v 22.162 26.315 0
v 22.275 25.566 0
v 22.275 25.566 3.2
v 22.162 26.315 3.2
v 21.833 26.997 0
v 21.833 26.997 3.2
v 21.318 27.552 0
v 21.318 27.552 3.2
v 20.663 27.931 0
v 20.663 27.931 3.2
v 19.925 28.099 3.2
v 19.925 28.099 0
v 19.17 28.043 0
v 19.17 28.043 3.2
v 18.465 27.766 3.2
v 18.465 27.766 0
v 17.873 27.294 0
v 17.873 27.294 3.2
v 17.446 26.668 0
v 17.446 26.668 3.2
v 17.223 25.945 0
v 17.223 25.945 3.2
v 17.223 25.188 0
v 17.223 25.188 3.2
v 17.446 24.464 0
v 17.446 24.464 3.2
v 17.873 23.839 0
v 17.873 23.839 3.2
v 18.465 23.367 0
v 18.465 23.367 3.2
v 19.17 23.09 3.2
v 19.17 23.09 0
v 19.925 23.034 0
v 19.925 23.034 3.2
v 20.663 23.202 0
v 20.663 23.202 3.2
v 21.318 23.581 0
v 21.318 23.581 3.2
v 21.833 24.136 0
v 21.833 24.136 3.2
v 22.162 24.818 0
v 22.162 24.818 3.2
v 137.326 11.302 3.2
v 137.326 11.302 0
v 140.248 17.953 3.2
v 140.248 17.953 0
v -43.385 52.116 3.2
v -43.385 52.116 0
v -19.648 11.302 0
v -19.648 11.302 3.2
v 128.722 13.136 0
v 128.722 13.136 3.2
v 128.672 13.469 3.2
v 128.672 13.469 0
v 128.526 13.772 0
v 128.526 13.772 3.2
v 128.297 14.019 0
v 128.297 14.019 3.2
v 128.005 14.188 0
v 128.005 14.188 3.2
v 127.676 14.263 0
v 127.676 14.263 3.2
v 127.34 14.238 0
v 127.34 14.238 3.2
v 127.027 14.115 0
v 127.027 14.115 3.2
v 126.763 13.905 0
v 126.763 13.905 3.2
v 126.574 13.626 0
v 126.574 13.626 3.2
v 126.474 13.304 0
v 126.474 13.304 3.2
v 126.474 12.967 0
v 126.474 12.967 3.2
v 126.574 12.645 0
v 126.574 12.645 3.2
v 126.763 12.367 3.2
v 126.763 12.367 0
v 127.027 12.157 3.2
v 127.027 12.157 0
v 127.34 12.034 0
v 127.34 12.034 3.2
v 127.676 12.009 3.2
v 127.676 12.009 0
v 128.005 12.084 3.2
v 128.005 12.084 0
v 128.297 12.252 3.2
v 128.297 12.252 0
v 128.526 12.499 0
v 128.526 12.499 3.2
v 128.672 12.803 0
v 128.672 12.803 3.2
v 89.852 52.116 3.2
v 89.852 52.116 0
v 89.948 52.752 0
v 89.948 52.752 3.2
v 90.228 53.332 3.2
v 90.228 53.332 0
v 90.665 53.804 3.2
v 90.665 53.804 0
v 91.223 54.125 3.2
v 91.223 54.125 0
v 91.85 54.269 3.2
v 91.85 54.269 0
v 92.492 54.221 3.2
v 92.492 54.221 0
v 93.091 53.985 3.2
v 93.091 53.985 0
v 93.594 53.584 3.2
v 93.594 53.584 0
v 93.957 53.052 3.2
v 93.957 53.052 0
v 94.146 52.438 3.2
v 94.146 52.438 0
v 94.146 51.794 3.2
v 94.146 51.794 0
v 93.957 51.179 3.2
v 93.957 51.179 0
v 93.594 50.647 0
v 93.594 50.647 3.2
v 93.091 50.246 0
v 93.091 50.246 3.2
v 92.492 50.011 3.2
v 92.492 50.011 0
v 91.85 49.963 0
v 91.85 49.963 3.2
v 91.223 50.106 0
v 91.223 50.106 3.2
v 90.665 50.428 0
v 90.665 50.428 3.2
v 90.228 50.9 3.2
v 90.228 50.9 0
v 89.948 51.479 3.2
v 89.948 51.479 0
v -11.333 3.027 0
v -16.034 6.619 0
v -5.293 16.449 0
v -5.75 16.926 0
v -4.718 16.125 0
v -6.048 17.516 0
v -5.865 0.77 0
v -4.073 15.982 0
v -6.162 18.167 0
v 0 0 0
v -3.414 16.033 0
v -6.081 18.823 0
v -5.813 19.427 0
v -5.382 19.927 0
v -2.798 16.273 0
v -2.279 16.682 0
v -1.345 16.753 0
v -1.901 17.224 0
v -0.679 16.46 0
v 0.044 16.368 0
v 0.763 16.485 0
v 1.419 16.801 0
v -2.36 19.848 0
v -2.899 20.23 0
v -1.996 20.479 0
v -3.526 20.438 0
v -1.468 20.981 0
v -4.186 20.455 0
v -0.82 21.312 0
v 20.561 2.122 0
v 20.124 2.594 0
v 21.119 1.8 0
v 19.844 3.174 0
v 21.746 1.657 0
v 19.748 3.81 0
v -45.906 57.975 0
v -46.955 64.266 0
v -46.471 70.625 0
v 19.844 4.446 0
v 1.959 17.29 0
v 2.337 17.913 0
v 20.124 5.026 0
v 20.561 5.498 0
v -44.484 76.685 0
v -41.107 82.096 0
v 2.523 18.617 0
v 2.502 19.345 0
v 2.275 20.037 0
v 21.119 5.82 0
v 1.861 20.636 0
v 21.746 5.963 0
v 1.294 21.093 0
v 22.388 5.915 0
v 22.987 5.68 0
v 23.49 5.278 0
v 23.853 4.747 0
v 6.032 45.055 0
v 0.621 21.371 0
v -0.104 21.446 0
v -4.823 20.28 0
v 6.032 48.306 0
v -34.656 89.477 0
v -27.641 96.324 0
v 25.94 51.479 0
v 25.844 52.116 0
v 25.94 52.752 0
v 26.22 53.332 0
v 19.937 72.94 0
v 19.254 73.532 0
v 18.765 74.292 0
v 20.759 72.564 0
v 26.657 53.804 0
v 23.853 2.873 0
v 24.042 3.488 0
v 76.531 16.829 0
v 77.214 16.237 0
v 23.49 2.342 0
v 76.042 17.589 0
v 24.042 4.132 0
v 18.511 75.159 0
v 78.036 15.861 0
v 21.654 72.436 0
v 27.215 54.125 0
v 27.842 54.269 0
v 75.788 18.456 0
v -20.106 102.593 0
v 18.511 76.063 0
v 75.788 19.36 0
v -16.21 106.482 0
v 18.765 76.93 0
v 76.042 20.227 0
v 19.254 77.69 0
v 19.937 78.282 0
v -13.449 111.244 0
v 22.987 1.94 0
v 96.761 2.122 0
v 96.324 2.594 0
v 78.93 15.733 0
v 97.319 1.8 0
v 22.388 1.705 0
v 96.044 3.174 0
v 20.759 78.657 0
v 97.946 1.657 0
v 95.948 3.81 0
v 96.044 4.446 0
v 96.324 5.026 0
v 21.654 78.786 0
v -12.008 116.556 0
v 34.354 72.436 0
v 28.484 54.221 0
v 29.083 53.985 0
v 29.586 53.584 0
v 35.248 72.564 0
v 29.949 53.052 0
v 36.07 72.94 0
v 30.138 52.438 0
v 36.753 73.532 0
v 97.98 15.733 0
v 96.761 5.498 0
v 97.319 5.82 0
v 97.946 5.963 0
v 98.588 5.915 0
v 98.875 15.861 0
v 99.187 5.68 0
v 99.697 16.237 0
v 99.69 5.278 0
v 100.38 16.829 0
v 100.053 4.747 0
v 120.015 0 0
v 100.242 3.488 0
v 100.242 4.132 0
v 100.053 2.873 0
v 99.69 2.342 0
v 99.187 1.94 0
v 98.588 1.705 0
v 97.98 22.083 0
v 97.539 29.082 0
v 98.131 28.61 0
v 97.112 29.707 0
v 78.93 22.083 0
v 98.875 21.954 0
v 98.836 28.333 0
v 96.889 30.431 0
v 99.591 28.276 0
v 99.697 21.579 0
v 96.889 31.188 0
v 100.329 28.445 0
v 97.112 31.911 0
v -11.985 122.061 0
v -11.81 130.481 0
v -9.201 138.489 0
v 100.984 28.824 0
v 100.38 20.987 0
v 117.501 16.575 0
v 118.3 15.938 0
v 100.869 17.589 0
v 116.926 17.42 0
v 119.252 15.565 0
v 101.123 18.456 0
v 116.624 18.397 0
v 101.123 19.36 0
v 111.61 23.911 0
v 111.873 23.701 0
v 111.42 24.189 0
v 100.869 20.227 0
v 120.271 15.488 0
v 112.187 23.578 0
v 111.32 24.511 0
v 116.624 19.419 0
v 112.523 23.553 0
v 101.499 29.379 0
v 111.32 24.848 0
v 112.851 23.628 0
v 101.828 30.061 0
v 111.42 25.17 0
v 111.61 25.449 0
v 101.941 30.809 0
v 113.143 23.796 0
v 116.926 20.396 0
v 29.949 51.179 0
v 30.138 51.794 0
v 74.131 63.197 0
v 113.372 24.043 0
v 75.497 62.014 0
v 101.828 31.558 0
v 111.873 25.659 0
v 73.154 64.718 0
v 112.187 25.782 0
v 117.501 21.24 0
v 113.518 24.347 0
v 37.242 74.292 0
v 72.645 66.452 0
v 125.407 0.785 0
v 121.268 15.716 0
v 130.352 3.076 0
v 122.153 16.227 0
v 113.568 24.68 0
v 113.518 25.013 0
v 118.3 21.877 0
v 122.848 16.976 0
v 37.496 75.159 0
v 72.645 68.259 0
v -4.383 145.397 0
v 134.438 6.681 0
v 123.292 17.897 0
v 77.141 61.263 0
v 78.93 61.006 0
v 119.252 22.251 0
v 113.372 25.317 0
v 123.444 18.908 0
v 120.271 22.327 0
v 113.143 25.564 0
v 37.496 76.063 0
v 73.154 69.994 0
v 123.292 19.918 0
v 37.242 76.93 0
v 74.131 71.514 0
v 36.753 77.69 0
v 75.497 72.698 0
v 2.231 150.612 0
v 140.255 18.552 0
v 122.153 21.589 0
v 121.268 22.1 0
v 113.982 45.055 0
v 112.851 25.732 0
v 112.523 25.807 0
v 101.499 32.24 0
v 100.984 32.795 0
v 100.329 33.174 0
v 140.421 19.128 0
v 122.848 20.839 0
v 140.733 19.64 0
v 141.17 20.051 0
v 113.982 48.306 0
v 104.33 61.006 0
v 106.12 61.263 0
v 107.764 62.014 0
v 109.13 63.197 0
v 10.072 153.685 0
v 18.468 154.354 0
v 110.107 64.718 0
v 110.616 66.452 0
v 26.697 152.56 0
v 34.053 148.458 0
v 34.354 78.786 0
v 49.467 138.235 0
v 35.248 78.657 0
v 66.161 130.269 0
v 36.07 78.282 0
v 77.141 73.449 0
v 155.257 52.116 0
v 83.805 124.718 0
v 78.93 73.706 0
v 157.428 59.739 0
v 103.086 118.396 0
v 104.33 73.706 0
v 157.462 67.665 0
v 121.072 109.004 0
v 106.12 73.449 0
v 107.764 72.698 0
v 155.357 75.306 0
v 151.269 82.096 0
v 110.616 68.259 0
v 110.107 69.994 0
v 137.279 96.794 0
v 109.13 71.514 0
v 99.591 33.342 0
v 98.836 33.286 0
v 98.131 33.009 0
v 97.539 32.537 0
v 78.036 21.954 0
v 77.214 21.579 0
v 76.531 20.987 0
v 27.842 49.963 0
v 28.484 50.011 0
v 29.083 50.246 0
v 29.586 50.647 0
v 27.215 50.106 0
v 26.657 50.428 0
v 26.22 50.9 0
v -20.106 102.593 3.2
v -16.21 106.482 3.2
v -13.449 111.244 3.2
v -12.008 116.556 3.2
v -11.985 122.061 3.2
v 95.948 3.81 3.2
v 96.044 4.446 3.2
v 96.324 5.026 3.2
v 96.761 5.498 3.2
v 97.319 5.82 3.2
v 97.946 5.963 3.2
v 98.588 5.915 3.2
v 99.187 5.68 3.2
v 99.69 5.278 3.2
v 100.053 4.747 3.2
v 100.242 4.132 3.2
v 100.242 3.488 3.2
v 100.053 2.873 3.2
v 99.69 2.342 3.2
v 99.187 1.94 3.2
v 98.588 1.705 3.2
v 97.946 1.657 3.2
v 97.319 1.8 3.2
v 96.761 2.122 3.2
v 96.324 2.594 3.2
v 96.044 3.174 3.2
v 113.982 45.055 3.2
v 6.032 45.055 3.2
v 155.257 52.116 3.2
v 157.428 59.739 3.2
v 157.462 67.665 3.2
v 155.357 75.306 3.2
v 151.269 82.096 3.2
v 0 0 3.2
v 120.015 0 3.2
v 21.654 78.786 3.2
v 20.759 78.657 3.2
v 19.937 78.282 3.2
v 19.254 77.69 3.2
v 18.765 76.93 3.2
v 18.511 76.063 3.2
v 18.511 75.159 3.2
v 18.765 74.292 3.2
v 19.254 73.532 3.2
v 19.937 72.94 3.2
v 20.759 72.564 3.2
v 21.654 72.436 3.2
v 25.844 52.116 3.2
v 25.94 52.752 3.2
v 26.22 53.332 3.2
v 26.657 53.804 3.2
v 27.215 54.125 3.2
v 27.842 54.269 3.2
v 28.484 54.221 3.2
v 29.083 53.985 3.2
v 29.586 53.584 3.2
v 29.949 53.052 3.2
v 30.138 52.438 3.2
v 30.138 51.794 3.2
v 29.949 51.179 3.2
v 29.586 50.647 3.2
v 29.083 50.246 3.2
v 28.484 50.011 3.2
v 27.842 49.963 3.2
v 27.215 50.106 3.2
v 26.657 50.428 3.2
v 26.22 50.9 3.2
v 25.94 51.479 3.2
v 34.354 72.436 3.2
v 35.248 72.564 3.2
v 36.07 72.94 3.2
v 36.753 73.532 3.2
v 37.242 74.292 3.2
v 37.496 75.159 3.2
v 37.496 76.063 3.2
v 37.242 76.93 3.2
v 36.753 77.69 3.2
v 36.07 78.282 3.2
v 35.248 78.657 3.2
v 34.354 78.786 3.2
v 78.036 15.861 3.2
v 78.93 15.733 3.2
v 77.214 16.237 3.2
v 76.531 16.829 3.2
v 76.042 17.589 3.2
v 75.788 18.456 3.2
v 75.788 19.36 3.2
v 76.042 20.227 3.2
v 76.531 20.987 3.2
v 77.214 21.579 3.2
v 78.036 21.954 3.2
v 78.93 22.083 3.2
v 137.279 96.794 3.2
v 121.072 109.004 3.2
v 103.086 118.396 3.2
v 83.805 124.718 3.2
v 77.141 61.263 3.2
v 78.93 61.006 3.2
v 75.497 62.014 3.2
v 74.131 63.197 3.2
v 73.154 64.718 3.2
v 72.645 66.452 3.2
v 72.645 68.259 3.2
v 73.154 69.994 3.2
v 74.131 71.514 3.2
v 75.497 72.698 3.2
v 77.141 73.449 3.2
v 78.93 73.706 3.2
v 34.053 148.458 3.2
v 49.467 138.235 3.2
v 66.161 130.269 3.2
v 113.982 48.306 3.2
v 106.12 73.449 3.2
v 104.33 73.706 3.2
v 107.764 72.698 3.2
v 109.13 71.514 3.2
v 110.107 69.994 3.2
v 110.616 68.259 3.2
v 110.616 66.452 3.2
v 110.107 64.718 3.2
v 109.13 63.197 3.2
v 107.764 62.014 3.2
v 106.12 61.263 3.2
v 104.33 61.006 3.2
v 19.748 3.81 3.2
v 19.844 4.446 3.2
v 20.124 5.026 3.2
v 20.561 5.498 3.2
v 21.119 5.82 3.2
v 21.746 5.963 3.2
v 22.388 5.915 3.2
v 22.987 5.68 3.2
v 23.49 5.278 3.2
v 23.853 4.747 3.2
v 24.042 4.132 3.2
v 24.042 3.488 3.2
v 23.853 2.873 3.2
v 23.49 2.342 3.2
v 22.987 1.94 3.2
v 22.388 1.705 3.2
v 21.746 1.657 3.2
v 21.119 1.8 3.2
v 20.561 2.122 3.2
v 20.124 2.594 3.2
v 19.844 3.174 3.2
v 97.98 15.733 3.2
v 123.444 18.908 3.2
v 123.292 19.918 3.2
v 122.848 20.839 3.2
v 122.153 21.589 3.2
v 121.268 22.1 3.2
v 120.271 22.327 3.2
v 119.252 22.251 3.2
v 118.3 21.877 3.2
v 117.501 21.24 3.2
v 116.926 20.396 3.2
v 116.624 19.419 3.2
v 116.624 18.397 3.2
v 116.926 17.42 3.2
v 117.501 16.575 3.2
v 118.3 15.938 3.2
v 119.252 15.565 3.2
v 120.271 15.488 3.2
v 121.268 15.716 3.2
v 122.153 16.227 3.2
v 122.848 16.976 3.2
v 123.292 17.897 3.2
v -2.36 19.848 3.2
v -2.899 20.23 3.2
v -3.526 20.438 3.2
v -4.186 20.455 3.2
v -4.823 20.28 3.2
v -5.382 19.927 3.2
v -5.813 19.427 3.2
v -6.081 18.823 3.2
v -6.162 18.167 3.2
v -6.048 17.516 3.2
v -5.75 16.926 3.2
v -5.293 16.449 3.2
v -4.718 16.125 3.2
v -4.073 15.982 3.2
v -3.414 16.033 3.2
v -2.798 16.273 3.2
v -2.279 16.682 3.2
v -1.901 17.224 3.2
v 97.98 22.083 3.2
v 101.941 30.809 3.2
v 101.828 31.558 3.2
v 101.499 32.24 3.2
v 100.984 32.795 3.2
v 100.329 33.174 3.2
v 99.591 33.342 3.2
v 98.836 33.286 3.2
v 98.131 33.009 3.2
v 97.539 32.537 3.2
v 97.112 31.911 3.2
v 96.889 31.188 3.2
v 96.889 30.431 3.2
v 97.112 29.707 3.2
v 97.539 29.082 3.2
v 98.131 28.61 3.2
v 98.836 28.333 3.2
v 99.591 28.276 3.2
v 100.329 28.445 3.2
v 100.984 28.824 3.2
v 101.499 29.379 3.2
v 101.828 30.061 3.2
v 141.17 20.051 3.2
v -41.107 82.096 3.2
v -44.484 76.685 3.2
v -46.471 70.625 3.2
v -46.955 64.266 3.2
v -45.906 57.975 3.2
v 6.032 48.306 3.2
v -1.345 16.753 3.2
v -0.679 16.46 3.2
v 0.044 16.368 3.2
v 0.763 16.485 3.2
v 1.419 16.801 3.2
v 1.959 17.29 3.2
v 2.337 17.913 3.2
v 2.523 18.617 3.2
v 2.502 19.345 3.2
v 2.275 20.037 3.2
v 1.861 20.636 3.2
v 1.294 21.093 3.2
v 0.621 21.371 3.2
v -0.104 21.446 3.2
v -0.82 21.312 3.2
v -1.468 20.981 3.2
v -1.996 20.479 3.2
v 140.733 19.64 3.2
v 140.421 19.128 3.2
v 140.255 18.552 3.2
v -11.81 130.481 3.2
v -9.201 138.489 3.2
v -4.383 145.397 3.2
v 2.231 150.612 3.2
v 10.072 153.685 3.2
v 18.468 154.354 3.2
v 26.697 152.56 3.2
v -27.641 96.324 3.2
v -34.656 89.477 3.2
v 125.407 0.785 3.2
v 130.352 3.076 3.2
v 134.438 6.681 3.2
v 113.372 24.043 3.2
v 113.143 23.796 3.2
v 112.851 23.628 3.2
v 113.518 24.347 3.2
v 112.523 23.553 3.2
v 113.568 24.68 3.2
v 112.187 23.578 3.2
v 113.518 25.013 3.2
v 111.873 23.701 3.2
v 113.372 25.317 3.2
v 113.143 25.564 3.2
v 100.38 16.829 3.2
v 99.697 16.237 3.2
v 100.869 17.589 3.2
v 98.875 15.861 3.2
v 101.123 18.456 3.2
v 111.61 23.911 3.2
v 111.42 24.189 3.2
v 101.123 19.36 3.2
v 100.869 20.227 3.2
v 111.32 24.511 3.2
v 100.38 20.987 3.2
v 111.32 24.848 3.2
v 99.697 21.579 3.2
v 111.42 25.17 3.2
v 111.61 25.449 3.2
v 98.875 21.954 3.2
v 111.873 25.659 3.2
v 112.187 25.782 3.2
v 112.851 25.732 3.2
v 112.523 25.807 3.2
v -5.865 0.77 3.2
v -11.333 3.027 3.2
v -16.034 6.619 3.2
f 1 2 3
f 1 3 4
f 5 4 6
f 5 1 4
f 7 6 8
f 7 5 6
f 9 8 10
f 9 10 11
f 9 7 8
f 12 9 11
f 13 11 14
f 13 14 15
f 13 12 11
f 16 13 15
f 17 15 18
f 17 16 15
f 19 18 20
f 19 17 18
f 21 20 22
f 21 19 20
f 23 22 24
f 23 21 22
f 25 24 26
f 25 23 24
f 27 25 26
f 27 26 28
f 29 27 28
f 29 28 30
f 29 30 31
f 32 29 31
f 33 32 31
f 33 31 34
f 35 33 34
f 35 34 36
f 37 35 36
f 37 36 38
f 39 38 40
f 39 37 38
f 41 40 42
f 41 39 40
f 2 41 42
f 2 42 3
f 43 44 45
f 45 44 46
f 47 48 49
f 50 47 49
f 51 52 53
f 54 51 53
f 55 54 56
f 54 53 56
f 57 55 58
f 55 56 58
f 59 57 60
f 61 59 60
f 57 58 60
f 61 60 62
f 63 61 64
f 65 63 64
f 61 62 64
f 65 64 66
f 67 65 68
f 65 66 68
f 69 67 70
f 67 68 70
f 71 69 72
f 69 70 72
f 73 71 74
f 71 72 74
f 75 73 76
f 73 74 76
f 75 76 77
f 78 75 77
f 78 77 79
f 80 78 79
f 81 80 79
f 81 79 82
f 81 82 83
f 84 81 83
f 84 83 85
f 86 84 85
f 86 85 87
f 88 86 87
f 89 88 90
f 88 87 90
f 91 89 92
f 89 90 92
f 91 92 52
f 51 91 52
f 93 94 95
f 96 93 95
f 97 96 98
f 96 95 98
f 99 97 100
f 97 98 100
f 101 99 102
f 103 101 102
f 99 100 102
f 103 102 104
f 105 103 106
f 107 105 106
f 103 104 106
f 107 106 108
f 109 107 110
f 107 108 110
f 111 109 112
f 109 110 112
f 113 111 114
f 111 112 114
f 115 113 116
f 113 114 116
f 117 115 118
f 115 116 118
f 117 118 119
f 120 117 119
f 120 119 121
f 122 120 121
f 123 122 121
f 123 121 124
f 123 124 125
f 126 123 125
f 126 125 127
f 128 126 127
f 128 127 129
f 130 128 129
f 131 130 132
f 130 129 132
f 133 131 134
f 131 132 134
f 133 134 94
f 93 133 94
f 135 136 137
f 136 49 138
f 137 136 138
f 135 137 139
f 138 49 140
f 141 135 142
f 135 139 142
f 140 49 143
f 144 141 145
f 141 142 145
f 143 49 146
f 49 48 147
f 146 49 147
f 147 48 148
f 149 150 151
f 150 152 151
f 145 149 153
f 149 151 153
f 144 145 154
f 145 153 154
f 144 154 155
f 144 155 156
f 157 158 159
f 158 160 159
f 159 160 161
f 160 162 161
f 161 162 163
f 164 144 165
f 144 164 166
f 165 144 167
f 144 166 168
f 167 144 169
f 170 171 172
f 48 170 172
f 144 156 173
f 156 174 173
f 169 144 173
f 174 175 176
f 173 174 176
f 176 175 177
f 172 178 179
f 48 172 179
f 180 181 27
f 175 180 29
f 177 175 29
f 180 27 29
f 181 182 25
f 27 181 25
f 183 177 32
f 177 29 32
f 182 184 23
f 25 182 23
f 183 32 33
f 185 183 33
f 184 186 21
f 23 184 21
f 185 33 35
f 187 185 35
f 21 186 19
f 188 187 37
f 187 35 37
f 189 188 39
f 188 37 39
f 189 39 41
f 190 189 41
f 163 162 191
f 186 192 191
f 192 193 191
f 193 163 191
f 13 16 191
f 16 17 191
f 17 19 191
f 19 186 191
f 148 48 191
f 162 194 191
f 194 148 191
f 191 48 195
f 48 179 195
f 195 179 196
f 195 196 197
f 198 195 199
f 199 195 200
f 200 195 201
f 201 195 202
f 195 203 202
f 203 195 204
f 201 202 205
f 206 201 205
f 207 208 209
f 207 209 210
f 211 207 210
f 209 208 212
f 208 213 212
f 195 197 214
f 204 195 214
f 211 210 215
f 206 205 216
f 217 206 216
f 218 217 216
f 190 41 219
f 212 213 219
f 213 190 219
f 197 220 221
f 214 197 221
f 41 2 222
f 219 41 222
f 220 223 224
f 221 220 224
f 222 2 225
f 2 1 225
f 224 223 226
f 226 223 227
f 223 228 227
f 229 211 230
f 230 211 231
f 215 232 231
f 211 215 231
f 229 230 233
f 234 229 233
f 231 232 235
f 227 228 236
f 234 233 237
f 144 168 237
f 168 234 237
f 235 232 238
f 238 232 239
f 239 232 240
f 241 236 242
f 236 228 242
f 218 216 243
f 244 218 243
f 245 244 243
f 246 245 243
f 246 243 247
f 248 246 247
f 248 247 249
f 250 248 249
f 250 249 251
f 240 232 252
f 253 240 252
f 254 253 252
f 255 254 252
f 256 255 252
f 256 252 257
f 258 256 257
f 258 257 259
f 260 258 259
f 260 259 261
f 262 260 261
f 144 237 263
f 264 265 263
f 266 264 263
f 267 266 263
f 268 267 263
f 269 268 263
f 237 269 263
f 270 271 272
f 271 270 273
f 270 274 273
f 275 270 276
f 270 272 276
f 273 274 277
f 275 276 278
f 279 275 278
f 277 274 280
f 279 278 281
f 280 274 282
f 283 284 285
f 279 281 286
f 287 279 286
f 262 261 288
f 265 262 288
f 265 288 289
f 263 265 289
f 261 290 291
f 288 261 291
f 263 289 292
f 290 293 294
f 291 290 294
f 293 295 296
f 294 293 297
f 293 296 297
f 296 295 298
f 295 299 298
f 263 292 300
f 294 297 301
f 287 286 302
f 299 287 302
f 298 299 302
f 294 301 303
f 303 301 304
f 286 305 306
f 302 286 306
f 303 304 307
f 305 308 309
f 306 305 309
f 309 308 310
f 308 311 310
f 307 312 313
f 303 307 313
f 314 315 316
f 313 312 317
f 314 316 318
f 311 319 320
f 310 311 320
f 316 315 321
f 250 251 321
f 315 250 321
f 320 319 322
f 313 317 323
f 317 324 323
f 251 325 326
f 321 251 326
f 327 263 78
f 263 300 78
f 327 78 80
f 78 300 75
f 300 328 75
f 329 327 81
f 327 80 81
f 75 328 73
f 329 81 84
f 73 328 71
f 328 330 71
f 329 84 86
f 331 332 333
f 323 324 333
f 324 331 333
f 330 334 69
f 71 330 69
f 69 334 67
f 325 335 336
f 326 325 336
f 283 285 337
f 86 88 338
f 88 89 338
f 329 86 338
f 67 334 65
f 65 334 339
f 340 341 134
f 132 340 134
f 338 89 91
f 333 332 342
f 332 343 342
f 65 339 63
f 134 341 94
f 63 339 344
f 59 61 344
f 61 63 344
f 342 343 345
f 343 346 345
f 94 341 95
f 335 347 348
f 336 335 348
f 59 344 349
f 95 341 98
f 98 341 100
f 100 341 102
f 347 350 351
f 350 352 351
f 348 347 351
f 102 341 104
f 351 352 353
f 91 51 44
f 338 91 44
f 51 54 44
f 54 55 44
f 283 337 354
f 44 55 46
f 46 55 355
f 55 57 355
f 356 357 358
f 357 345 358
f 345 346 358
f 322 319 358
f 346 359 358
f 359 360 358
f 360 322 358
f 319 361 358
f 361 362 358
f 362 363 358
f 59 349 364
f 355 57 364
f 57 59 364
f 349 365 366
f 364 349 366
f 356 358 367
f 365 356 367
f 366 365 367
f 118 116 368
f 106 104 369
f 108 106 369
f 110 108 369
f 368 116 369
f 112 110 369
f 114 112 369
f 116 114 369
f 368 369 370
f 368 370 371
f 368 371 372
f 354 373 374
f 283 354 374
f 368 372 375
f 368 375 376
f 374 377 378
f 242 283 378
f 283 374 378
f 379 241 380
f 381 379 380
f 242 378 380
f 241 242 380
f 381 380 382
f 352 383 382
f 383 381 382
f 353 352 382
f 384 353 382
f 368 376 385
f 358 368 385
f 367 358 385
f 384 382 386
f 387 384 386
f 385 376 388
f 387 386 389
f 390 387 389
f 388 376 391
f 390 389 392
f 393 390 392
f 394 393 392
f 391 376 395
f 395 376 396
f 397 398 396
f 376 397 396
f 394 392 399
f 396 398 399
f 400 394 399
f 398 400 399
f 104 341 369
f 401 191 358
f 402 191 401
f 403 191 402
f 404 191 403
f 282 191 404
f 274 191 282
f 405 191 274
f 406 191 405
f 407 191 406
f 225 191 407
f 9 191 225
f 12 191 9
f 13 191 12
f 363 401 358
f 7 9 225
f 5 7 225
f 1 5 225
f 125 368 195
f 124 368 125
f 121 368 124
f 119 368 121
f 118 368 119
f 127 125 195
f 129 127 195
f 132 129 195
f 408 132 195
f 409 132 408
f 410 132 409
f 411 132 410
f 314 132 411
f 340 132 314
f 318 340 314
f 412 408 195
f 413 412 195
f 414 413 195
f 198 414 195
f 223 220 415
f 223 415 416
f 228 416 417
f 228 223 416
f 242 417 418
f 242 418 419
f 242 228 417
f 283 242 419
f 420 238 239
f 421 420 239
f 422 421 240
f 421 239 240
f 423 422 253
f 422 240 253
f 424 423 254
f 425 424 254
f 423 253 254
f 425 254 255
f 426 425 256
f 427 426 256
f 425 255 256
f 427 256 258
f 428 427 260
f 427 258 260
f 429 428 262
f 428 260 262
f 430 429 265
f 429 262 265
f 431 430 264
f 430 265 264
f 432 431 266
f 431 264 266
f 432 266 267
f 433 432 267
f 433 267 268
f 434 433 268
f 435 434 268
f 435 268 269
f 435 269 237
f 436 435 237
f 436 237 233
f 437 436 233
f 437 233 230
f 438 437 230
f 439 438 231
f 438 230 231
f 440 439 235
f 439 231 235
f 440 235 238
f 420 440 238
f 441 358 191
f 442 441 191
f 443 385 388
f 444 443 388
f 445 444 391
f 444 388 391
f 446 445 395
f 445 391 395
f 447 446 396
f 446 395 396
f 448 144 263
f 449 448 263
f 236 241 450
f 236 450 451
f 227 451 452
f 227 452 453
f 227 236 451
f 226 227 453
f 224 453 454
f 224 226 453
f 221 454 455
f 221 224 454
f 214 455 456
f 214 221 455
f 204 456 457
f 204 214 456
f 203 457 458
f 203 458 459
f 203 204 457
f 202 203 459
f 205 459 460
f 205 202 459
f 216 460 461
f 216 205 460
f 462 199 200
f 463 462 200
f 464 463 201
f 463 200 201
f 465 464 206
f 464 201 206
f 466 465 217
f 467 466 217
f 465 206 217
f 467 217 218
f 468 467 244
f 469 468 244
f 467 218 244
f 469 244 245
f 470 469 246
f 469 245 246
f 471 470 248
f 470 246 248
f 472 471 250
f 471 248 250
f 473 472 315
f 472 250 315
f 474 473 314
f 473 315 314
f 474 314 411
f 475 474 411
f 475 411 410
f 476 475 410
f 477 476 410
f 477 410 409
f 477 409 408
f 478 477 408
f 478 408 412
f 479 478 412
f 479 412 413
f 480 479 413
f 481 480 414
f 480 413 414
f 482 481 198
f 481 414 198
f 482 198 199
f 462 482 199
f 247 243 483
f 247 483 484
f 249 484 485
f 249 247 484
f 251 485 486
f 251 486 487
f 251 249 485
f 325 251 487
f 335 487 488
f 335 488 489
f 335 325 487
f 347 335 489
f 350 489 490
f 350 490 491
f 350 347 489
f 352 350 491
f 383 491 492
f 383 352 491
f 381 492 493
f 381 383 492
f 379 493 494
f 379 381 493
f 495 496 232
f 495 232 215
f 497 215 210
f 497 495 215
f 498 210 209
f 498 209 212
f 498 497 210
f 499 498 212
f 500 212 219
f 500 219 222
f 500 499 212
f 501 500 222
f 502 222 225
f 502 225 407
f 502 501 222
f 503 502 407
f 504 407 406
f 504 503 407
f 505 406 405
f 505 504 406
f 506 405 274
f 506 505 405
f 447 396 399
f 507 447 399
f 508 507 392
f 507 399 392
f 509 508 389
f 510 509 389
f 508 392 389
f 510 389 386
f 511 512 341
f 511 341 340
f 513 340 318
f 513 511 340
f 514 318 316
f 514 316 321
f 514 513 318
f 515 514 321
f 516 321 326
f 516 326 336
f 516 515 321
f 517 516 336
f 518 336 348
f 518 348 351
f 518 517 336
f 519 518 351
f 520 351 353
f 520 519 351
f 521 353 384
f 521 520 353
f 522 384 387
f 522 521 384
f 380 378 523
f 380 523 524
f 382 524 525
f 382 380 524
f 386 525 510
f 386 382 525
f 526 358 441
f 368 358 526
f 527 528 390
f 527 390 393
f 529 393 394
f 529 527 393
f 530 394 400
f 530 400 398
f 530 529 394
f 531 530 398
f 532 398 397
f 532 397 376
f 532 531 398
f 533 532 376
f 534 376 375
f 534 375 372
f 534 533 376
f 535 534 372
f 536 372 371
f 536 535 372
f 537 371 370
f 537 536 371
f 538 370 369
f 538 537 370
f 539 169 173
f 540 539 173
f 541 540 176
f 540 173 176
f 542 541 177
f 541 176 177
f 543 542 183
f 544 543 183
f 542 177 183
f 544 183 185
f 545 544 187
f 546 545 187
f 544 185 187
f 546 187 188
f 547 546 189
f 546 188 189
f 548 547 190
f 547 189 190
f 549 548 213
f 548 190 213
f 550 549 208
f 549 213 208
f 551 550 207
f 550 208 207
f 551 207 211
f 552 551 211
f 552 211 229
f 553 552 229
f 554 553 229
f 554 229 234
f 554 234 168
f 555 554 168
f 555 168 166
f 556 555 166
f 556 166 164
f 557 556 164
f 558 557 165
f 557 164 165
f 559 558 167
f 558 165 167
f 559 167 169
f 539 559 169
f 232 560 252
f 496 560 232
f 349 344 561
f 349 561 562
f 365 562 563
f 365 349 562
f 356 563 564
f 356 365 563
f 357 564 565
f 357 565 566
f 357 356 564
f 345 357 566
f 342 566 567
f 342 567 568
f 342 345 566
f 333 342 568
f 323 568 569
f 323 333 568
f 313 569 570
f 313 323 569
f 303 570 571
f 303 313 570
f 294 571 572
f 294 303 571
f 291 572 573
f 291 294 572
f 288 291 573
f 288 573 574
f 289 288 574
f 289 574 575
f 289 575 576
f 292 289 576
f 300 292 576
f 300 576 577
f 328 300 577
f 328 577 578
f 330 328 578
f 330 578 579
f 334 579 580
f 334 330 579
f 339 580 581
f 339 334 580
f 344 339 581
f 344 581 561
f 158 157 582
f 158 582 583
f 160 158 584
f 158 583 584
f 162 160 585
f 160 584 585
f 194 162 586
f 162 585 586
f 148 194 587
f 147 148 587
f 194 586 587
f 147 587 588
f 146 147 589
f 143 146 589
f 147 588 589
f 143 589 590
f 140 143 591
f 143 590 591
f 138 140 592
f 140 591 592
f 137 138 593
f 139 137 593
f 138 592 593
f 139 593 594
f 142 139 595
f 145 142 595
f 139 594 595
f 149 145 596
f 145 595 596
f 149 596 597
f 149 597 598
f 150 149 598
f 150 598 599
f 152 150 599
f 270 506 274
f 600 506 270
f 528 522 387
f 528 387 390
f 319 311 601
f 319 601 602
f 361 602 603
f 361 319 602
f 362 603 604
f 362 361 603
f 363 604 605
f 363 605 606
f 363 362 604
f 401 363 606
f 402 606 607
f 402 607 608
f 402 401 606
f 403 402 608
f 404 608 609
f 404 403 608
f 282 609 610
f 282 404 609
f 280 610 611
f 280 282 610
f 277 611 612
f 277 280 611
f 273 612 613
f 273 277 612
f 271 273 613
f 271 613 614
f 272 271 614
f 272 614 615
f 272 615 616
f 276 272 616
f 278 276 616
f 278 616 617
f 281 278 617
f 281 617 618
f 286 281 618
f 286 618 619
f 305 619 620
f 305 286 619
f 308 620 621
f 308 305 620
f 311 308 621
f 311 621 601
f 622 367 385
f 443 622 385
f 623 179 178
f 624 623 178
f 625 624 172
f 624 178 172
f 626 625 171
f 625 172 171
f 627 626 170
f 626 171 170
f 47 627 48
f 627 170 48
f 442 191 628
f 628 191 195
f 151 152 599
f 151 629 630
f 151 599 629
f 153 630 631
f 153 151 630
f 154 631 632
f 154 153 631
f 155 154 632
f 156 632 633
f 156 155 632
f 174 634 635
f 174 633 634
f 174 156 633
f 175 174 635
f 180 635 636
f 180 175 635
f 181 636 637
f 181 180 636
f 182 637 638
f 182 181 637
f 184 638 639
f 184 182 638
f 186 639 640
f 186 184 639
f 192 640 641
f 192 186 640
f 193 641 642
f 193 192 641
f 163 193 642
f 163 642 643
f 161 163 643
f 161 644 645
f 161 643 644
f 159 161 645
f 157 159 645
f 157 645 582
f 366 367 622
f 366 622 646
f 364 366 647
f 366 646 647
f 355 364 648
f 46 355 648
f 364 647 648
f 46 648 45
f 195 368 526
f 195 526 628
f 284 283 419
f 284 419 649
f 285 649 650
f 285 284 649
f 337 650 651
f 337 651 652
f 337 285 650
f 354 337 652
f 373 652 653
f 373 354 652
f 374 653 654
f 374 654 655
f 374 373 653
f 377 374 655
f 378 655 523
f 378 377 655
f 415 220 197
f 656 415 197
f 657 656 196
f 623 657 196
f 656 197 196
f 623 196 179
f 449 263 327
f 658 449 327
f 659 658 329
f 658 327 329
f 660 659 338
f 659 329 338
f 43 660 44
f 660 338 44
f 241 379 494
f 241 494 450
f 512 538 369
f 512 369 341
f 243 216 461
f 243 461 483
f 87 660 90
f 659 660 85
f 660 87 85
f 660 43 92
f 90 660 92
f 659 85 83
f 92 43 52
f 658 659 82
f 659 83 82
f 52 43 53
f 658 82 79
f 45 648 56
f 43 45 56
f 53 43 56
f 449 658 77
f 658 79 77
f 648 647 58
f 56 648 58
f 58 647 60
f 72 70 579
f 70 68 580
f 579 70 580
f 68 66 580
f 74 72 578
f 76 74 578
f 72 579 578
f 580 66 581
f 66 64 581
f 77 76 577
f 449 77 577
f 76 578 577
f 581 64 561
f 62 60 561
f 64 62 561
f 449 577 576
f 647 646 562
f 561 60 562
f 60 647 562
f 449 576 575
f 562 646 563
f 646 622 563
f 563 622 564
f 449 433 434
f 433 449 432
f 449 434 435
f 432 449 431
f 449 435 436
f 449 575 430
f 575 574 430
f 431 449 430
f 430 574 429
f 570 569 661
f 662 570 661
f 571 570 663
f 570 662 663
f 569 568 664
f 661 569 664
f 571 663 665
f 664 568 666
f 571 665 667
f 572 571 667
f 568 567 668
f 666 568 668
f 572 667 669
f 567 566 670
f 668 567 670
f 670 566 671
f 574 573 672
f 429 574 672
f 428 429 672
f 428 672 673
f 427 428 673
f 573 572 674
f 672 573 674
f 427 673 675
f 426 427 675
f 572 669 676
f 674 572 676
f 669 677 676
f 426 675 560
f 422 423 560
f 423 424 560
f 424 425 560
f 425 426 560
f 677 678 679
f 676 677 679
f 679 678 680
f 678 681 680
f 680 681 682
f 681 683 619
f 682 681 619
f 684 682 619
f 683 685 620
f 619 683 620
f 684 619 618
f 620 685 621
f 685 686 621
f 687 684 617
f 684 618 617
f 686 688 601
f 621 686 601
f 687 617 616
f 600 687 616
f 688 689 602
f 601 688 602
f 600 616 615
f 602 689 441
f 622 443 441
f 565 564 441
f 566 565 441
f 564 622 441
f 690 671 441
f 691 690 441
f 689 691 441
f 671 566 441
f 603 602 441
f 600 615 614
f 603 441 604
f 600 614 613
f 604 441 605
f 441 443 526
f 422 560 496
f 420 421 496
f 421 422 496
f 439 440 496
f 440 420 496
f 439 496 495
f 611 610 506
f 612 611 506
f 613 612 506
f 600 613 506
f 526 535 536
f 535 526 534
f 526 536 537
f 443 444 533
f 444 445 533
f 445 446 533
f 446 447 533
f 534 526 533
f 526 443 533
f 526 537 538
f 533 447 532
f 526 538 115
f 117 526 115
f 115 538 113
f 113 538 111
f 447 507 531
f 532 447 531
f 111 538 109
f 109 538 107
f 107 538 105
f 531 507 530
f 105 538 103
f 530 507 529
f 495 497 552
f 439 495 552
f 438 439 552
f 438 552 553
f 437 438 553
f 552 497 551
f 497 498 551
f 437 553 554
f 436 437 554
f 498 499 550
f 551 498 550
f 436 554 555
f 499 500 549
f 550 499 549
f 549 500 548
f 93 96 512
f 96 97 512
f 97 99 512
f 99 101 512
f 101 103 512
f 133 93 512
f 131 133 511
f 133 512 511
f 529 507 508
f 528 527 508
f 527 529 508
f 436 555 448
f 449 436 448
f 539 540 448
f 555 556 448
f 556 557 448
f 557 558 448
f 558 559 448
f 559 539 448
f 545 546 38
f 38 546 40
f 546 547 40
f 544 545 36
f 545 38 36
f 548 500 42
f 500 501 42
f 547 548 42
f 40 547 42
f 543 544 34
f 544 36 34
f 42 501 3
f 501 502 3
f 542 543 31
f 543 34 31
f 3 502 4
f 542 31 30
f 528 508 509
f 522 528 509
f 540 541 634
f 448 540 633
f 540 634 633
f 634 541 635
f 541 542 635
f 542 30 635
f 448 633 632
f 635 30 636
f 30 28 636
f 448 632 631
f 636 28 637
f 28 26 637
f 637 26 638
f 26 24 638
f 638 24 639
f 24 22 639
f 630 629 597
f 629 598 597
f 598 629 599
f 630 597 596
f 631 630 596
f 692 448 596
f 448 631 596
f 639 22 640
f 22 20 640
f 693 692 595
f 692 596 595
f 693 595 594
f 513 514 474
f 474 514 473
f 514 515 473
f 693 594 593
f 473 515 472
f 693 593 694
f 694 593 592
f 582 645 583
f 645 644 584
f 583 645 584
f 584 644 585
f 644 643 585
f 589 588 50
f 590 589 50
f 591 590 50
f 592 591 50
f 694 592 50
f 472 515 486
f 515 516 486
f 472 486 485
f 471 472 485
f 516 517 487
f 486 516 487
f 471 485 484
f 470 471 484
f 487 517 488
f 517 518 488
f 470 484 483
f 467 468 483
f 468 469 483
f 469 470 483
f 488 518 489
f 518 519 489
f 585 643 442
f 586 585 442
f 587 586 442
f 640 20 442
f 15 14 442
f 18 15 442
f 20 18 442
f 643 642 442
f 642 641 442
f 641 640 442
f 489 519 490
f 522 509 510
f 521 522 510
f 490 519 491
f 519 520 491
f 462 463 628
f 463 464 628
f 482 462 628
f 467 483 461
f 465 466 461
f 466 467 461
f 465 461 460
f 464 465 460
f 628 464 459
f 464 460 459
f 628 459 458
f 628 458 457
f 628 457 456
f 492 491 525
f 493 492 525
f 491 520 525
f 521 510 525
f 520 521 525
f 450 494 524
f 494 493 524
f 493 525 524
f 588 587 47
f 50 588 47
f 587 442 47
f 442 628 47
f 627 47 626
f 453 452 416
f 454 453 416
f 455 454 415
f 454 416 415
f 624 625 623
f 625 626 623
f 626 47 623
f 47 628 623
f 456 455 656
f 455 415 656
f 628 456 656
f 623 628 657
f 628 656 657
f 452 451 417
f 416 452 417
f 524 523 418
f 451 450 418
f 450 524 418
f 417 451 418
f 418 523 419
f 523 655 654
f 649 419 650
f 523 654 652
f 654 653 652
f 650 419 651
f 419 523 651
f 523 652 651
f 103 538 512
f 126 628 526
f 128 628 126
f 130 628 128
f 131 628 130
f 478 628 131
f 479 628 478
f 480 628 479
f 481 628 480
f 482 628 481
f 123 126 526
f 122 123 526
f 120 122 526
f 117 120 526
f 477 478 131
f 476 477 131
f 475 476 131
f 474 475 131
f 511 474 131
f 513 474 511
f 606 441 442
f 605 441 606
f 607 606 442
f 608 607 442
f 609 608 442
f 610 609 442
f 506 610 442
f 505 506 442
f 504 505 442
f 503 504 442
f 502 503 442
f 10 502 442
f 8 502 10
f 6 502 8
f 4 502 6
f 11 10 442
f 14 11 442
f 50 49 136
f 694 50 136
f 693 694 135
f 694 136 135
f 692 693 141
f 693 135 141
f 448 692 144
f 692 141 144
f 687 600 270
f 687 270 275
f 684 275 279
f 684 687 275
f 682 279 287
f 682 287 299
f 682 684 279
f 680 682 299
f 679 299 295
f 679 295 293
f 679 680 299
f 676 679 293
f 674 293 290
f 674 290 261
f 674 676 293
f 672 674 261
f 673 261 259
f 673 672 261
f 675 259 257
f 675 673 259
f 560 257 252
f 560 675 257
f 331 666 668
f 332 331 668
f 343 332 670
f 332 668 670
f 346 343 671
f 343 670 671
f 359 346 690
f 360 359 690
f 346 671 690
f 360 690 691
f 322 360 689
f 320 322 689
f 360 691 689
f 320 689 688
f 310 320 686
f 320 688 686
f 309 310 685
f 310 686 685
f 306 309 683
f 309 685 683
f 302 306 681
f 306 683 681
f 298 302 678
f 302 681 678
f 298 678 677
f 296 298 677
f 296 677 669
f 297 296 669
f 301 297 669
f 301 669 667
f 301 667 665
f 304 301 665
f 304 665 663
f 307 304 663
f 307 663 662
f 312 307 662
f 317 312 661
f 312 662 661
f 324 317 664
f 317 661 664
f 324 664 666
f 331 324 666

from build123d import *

# Parameters (mm, degrees)
SKETCH1_R           = 3.429
SKETCH1_R_2         = 2.54
BOSS_EXTRUDE1_DEPTH = 3.2004
SKETCH2_R           = 2.159
CUT_EXTRUDE1_DEPTH  = 3.2004
CUT_EXTRUDE8_DEPTH  = 3.2004
SKETCH11_W          = 107.95
SKETCH11_H          = 3.2512
CUT_EXTRUDE9_DEPTH  = 3.2004
SKETCH12_R          = 1.1303
CUT_EXTRUDE11_DEPTH = 3.2004
SKETCH13_R          = 2.2479
CUT_EXTRUDE12_DEPTH = 3.2004
BOSS_EXTRUDE2_DEPTH = 3.2004


with BuildPart() as part:
    # Sketch1 → Boss-Extrude1 (new body)
    with BuildSketch(Plane.XY):
        with BuildLine():
            Line((0, 0), (120.015, 0))
            ThreePointArc((120.015, 0), (130.351788397, 3.075697789), (137.325636158, 11.302152593))
            Line((137.325636158, 11.302152593), (155.257499999, 52.11572))
            ThreePointArc((155.257499999, 52.11572), (157.462147967, 67.664529981), (151.26869294, 82.095991421))
            ThreePointArc((151.26869294, 82.095991421), (55.081013593, 128.103082212), (-41.106665754, 82.095991421))
            ThreePointArc((-41.106665754, 82.095991421), (-46.904819593, 67.459968464), (-43.385473773, 52.11572))
            Line((-43.385473773, 52.11572), (-19.648099871, 11.302152593))
            ThreePointArc((-19.648099871, 11.302152593), (-11.333429333, 3.027112684), (0, 0))
        make_face()
        with Locations((120.015, 18.90776)):
            Circle(SKETCH1_R, mode=Mode.SUBTRACT)
        with Locations((0, 18.90776)):
            Circle(SKETCH1_R_2, mode=Mode.SUBTRACT)
        with Locations((19.734727626, 25.566426992)):
            Circle(SKETCH1_R_2, mode=Mode.SUBTRACT)
        with Locations((99.400822531, 30.809360911)):
            Circle(SKETCH1_R_2, mode=Mode.SUBTRACT)
    extrude(amount=BOSS_EXTRUDE1_DEPTH)

    # Sketch2 → Cut-Extrude1 (cut)
    with BuildSketch(Plane(origin=(0, 0, 0), x_dir=(-1, 0, 0), z_dir=(0, 0, -1))):
        with Locations((-92.0115, 52.115719911)):
            Circle(SKETCH2_R)
        with Locations((-28.0035, 52.115719911)):
            Circle(SKETCH2_R)
        with Locations((-98.1075, 3.81)):
            Circle(SKETCH2_R)
        with Locations((-21.9075, 3.81)):
            Circle(SKETCH2_R)
    extrude(amount=-CUT_EXTRUDE1_DEPTH, mode=Mode.SUBTRACT)

    # Sketch10 → Cut-Extrude8 (cut)
    with BuildSketch(Plane(origin=(0, 0, 0), x_dir=(-1, 0, 0), z_dir=(0, 0, -1))):
        with BuildLine():
            Line((-34.3535, 78.785719911), (-21.6535, 78.785719911))
            ThreePointArc((-21.6535, 78.785719911), (-18.4785, 75.610719911), (-21.6535, 72.435719911))
            Line((-21.6535, 72.435719911), (-34.3535, 72.435719911))
            ThreePointArc((-34.3535, 72.435719911), (-37.5285, 75.610719911), (-34.3535, 78.785719911))
        make_face()
    extrude(amount=-CUT_EXTRUDE8_DEPTH, mode=Mode.SUBTRACT)

    # Sketch11 → Cut-Extrude9 (cut)
    with BuildSketch(Plane(origin=(0, 0, 0), x_dir=(-1, 0, 0), z_dir=(0, 0, -1))):
        with Locations((-60.0075, 46.680119911)):
            Rectangle(SKETCH11_W, SKETCH11_H)
    extrude(amount=-CUT_EXTRUDE9_DEPTH, mode=Mode.SUBTRACT)

    # Sketch12 → Cut-Extrude11 (cut)
    with BuildSketch(Plane.XY.offset(3.2004)):
        with Locations((112.438115095, 24.679799513)):
            Circle(SKETCH12_R)
        with Locations((127.591884905, 13.135720487)):
            Circle(SKETCH12_R)
        with BuildLine():
            Line((78.9305, 73.70572), (104.3305, 73.70572))
            ThreePointArc((104.3305, 73.70572), (110.6805, 67.35572), (104.3305, 61.00572))
            Line((104.3305, 61.00572), (78.9305, 61.00572))
            ThreePointArc((78.9305, 61.00572), (72.5805, 67.35572), (78.9305, 73.70572))
        make_face()
        with BuildLine():
            Line((78.9305, 22.08276), (97.9805, 22.08276))
            ThreePointArc((97.9805, 22.08276), (101.1555, 18.90776), (97.9805, 15.73276))
            Line((97.9805, 15.73276), (78.9305, 15.73276))
            ThreePointArc((78.9305, 15.73276), (75.7555, 18.90776), (78.9305, 22.08276))
        make_face()
    extrude(amount=-CUT_EXTRUDE11_DEPTH, mode=Mode.SUBTRACT)

    # Sketch13 → Cut-Extrude12 (cut)
    with BuildSketch(Plane.XY.offset(3.2004)):
        with Locations((-3.91433865, 18.224067698)):
            Circle(SKETCH13_R)
        with Locations((142.479014632, 18.224067698)):
            Circle(SKETCH13_R)
    extrude(amount=-CUT_EXTRUDE12_DEPTH, mode=Mode.SUBTRACT)

    # Sketch15 → Boss-Extrude2 (add)
    with BuildSketch(Plane(origin=(0, 0, 0), x_dir=(-1, 0, 0), z_dir=(0, 0, -1))):
        with BuildLine():
            Line((-83.804619008, 124.717903233), (20.105573884, 102.592791936))
            ThreePointArc((20.105573884, 102.592791936), (13.448555564, 111.243555983), (11.985080527, 122.060665224))
            ThreePointArc((11.985080527, 122.060665224), (-2.230930753, 150.611793243), (-34.052645192, 148.457639579))
            ThreePointArc((-34.052645192, 148.457639579), (-57.674180086, 133.958784174), (-83.804619008, 124.717903233))
        make_face()
    extrude(amount=-BOSS_EXTRUDE2_DEPTH)


solid = part.part
